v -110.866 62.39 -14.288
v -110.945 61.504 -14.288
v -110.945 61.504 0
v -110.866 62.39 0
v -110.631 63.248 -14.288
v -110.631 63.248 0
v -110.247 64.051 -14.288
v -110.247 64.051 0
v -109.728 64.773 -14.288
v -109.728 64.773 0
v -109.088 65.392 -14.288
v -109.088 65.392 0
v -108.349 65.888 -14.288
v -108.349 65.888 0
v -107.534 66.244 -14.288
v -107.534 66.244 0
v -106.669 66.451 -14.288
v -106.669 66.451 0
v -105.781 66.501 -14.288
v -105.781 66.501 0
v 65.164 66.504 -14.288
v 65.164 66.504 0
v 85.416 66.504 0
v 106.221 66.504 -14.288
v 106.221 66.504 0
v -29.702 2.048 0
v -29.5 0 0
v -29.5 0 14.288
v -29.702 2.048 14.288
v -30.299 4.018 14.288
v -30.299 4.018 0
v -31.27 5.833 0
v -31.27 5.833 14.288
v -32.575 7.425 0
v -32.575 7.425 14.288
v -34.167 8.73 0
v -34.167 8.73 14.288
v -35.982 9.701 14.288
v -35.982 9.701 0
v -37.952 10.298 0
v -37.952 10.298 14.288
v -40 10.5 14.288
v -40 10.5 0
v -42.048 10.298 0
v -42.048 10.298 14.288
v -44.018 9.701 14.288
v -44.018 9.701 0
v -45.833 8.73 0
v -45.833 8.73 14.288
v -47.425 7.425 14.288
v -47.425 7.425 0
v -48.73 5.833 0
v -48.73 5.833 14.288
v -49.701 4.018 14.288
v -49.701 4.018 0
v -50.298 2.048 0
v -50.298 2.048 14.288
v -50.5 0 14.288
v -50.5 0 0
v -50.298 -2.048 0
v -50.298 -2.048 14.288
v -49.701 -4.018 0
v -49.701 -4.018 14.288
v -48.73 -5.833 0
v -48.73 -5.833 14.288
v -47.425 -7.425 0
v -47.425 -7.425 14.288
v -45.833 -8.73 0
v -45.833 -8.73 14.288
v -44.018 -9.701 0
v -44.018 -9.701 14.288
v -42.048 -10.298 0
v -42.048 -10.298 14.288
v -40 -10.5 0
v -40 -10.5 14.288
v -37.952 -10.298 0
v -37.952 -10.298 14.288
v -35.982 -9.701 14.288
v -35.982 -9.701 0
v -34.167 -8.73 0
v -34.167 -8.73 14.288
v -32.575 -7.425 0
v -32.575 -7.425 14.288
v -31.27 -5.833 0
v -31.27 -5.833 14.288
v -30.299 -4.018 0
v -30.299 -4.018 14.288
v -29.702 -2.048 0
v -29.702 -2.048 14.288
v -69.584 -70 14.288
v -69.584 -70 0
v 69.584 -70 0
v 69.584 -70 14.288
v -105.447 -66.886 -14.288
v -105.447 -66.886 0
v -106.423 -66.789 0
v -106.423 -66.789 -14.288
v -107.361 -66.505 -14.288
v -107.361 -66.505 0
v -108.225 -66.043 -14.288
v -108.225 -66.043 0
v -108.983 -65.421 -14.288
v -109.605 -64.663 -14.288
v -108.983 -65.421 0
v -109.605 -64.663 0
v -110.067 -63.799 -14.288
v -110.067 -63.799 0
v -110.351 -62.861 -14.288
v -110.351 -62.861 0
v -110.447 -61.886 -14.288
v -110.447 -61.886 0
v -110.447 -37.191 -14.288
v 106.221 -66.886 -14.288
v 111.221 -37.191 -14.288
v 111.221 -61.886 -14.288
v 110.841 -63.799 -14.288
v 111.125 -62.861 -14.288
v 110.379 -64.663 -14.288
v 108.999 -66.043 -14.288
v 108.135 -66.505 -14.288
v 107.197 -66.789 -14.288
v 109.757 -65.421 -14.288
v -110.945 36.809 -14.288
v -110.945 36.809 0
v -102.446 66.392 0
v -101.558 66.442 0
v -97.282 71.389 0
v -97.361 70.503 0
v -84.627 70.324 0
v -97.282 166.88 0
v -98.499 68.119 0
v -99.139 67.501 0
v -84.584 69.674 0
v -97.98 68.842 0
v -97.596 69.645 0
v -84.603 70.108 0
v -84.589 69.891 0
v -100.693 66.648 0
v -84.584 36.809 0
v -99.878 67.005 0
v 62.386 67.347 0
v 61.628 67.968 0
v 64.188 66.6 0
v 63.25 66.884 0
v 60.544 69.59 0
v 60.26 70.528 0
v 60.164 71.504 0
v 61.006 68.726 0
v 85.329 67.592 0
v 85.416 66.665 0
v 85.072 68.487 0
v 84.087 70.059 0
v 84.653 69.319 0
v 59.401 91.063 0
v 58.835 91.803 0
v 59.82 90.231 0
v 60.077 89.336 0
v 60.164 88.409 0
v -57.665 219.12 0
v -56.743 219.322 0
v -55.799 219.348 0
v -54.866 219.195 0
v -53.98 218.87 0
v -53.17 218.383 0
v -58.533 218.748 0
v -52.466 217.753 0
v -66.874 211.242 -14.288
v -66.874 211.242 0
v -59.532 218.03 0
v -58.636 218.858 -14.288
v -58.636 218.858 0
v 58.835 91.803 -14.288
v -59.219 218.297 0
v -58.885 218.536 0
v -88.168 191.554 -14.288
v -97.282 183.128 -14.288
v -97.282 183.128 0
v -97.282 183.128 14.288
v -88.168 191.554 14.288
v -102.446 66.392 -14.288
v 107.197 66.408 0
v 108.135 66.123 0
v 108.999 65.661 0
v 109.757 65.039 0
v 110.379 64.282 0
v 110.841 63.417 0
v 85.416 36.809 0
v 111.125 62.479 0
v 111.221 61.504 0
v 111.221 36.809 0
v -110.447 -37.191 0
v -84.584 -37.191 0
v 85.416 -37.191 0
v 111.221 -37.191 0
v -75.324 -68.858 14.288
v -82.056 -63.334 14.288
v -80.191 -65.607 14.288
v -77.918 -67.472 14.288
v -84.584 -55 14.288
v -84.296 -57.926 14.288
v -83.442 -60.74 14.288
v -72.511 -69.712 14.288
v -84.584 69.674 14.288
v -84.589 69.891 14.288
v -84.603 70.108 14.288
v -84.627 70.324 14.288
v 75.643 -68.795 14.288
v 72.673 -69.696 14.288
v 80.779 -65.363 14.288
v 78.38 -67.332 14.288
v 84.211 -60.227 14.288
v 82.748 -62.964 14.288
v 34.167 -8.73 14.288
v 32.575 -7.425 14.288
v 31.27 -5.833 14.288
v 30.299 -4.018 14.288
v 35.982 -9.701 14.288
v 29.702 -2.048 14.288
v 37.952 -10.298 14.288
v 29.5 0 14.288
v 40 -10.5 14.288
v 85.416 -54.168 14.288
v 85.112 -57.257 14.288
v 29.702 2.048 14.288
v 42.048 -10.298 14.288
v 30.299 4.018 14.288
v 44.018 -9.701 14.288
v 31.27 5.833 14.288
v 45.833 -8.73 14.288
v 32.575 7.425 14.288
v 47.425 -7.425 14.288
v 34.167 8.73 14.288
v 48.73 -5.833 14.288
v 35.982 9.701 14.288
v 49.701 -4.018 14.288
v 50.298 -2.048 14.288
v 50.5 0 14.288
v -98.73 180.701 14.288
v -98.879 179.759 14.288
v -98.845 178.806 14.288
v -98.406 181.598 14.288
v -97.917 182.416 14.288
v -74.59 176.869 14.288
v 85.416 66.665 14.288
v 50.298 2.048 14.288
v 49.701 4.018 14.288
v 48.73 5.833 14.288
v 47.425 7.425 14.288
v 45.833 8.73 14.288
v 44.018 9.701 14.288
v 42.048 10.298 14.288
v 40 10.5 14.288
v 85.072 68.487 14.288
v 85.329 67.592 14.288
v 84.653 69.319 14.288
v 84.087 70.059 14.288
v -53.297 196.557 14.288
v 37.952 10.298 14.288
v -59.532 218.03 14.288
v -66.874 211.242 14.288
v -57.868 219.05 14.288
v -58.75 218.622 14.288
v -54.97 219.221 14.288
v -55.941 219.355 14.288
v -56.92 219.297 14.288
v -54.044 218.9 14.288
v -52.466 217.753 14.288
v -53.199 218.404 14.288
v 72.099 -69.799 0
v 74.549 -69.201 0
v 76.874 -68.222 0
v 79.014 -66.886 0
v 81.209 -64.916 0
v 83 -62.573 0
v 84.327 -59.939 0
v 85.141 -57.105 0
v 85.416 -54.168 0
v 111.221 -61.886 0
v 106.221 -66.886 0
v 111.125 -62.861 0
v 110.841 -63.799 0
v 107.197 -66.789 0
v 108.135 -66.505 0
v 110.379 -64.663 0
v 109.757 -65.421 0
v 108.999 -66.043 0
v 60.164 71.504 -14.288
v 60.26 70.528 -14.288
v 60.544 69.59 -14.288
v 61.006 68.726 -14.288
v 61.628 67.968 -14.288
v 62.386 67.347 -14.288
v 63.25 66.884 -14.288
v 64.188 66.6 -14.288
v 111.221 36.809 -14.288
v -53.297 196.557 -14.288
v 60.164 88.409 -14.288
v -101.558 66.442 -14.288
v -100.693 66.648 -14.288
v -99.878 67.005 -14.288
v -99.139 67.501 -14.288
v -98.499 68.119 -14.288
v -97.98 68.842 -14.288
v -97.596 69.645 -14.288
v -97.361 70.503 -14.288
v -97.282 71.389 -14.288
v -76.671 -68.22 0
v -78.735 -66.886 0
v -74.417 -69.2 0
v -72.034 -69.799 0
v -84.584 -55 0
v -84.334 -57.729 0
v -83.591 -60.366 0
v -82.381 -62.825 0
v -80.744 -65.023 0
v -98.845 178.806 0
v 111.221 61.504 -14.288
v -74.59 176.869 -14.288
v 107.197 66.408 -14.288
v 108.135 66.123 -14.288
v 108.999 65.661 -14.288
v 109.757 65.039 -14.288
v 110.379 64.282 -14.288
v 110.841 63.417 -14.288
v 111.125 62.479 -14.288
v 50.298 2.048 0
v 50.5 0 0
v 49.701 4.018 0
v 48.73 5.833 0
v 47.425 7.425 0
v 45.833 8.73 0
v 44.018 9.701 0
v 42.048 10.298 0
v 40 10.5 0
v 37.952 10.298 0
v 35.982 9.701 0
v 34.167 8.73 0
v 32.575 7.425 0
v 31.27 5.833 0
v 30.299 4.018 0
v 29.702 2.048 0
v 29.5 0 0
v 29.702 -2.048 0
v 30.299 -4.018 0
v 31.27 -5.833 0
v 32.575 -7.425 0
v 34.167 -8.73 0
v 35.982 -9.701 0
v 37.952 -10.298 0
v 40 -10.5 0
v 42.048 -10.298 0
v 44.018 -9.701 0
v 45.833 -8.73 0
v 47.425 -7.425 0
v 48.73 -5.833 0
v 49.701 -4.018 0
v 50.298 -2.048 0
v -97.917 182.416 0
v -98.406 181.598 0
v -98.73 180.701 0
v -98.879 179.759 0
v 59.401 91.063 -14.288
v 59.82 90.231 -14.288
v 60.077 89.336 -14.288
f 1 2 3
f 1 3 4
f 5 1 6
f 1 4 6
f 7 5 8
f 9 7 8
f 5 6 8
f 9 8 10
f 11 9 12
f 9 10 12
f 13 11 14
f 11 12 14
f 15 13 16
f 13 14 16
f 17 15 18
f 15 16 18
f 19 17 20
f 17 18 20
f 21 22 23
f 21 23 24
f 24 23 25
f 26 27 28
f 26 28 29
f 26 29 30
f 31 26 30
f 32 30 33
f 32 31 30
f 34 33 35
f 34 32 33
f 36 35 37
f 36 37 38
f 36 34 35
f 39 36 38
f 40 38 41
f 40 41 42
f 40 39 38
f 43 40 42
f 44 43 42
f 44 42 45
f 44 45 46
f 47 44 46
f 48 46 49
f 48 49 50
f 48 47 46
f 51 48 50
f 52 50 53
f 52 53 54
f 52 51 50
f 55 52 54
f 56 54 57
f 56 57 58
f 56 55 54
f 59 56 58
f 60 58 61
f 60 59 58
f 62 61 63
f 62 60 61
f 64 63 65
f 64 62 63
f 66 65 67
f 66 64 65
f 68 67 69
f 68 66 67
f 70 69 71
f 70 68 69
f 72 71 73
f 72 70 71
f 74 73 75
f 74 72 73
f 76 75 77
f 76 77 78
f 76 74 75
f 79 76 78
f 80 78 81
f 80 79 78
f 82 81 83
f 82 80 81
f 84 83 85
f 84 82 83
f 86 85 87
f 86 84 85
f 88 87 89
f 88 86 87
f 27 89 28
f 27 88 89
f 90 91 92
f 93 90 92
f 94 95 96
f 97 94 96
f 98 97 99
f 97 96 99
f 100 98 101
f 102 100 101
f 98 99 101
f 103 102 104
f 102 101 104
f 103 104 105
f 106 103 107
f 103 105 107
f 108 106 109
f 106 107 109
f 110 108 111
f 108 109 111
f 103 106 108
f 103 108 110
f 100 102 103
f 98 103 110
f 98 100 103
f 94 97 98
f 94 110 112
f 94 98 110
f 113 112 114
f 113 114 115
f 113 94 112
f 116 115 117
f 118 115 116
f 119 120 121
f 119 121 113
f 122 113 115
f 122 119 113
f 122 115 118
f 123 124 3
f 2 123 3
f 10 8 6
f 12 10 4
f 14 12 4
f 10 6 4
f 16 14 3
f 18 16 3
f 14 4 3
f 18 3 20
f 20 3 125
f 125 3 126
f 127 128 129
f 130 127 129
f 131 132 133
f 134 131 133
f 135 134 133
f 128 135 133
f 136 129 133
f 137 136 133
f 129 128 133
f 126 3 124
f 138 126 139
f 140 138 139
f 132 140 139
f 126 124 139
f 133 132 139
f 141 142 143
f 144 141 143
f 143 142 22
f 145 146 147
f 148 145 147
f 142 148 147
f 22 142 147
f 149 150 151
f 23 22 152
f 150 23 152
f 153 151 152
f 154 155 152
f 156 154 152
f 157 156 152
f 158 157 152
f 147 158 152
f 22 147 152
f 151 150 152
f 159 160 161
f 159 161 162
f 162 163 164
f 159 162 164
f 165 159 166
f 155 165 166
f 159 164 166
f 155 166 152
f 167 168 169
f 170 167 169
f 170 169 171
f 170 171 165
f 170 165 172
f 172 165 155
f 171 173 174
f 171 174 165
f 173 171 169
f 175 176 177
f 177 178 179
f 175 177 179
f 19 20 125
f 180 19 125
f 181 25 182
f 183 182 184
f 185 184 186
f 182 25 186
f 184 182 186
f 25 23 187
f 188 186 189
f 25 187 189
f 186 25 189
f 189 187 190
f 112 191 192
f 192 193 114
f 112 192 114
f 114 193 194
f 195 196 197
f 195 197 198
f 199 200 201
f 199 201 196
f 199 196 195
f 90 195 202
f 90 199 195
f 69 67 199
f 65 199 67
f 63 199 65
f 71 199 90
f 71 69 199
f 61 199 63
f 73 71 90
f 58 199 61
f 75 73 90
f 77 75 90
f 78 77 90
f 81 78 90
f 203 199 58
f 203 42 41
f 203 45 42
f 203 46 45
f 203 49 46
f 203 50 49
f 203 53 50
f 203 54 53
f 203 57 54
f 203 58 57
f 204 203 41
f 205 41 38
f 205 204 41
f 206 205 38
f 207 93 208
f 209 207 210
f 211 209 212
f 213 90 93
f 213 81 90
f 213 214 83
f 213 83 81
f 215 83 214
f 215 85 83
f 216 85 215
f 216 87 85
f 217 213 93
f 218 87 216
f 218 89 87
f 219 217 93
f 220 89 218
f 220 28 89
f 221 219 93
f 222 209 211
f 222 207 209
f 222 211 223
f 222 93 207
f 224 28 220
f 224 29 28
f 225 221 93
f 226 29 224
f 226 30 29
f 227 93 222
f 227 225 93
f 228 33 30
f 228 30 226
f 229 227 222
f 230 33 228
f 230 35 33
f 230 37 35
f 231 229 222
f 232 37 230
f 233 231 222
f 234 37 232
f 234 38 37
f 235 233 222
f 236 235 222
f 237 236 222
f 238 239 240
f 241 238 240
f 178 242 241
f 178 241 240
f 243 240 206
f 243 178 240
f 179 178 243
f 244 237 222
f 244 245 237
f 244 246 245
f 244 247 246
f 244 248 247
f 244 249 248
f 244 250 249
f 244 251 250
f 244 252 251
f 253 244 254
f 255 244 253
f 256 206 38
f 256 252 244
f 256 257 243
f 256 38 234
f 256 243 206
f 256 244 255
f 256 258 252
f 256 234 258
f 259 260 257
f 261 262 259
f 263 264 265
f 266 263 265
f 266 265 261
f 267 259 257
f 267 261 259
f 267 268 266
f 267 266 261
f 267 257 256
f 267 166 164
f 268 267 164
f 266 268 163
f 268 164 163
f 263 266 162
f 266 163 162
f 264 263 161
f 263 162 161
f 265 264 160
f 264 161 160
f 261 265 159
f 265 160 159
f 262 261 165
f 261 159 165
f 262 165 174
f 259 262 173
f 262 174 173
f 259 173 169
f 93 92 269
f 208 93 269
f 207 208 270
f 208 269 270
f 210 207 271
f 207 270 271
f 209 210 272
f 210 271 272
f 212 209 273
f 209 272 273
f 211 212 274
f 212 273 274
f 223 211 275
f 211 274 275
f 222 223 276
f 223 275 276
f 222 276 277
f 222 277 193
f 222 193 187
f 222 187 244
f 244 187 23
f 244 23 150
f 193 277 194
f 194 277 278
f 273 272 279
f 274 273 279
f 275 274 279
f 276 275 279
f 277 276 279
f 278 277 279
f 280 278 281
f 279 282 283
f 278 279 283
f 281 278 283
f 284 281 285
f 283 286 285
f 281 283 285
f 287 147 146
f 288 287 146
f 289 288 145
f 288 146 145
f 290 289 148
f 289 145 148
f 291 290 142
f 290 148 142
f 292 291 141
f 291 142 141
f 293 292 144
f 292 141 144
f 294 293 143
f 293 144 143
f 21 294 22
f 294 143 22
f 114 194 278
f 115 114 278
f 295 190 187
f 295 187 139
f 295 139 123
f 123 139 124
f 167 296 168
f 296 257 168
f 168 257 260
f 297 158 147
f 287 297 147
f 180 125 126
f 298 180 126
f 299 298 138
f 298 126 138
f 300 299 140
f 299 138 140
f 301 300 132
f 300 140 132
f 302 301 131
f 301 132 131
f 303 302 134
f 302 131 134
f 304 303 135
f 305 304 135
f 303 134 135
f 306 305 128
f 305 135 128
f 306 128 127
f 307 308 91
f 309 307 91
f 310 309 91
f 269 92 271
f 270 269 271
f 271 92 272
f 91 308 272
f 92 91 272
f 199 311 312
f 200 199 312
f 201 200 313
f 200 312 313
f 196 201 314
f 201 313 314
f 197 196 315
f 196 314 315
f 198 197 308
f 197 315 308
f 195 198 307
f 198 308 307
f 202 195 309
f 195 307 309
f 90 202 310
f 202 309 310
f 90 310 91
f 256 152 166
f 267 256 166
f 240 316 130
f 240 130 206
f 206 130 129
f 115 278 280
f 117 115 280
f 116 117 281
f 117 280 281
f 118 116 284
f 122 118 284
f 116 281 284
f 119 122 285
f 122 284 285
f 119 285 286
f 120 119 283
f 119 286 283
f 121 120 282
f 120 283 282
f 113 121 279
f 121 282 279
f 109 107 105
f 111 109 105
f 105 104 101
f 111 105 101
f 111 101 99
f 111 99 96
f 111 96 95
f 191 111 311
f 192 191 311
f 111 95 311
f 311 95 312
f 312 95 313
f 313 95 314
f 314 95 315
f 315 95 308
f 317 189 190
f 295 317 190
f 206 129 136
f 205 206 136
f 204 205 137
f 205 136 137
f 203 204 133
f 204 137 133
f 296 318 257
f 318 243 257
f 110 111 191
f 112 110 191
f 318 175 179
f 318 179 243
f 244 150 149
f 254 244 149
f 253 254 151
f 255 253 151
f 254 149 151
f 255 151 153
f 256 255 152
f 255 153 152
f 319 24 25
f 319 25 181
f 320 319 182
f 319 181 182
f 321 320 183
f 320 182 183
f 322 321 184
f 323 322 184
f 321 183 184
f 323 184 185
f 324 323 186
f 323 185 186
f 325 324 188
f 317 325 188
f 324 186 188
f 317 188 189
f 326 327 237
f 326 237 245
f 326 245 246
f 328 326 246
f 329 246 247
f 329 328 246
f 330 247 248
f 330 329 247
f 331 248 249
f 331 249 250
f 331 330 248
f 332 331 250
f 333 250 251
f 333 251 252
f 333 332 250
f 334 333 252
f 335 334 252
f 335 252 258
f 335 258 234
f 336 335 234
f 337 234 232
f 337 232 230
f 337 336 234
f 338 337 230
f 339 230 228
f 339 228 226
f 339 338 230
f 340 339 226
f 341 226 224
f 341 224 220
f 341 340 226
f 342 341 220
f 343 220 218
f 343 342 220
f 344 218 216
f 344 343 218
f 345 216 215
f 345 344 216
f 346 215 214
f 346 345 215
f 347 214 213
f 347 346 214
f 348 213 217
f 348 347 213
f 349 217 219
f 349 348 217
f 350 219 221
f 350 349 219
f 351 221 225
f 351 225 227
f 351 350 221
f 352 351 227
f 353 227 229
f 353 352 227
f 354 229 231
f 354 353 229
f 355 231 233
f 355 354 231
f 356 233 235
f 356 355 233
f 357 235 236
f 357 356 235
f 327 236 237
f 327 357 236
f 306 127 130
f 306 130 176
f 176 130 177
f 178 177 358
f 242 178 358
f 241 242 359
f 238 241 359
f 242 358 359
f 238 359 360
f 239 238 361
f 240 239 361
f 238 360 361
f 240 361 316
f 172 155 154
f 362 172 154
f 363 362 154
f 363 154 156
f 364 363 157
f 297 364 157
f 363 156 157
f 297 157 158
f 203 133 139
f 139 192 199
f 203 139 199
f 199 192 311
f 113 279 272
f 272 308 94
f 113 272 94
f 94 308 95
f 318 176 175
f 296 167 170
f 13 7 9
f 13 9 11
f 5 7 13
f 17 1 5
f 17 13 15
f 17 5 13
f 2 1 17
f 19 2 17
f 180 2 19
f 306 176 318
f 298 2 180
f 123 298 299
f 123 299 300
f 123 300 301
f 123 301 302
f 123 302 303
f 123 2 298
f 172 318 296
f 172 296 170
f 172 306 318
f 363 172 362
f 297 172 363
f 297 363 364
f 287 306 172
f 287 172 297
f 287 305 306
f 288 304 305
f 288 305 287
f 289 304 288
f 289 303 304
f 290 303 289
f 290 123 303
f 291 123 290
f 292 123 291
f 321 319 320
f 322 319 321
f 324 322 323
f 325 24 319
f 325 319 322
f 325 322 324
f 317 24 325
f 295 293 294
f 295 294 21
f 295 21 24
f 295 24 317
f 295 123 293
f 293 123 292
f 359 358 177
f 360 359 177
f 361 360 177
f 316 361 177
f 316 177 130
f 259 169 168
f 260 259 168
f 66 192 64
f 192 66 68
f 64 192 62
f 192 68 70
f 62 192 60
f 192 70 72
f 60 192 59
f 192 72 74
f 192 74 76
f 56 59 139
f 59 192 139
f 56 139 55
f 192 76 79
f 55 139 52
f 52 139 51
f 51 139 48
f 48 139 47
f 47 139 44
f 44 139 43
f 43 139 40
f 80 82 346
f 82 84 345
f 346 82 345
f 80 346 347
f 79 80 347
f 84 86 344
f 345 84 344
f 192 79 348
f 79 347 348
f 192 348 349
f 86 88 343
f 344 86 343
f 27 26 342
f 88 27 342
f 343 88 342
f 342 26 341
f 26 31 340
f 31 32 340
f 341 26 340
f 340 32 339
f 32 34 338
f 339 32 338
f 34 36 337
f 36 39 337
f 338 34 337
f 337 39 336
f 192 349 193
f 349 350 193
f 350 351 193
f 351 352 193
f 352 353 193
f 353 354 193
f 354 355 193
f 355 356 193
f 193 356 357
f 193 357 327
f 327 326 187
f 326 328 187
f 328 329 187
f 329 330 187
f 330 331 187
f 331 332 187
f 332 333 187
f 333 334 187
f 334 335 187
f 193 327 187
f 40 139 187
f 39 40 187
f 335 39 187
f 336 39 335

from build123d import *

# Parameters (mm, degrees)
F0_R     = 10.5
F1_DEPTH = 14.2875
F3_DEPTH = 14.2875
F5_DEPTH = 14.2875


# Not quite as in the source:
# - a length typed as a fraction of an inch, garbled in the dataset ("3 / 203.2 mm" for 3/8 in), is restored
# - a feature names something its author has since deleted; it is built from what else it names


with BuildPart() as f1:
    # F0 (on Top) → F1 (new body)
    with BuildSketch(Plane.XY):
        with BuildLine():
            ThreePointArc((-84.5842045546, -55), (-80.1908062724, -65.6066017178), (-69.5842045546, -70))
            Line((-69.5842045546, -70), (69.5842045546, -70))
            ThreePointArc((69.5842045546, -70), (80.7788298305, -65.363034385), (85.4157954454, -54.1684091091))
            Line((85.4157954454, -54.1684091091), (85.4157954454, 66.6648875964))
            ThreePointArc((85.4157954454, 66.6648875964), (85.0717839963, 68.487460123), (84.0870871996, 70.0592383231))
            Line((84.0870871996, 70.0592383231), (-52.4659380977, 217.7534620916))
            ThreePointArc((-52.4659380977, 217.7534620916), (-55.9414029733, 219.3552750765), (-59.5315805785, 218.030403119))
            Line((-59.5315805785, 218.030403119), (-66.8741640868, 211.2417016656))
            Line((-66.8741640868, 211.2417016656), (-53.29676118, 196.556534649))
            Line((-53.29676118, 196.556534649), (-63.9435072671, 186.7129175415))
            Line((-63.9435072671, 186.7129175415), (-74.5902533541, 176.8693004341))
            Line((-74.5902533541, 176.8693004341), (-88.1676562609, 191.5544674507))
            Line((-88.1676562609, 191.5544674507), (-97.2821017235, 183.1275630663))
            ThreePointArc((-97.2821017235, 183.1275630663), (-98.5895263572, 181.1572441104), (-98.845348912, 178.8064844924))
            Line((-98.845348912, 178.8064844924), (-84.6266066394, 70.3235099279))
            ThreePointArc((-84.6266066394, 70.3235099279), (-84.5948163368, 69.9993075241), (-84.5842045546, 69.673723108))
            Line((-84.5842045546, 69.673723108), (-84.5842045546, -55))
        make_face()
        with Locations((-40, 0)):
            Circle(F0_R, mode=Mode.SUBTRACT)
        with Locations((40, 0)):
            Circle(F0_R, mode=Mode.SUBTRACT)
    extrude(amount=F1_DEPTH)

    # F2 (on face) → F3 (join)
    with BuildSketch(Plane(origin=(0, 0, 0), x_dir=(1, 0, 0), z_dir=(0, 0, -1))):
        with BuildLine():
            ThreePointArc((111.2211793661, 61.8855160475), (109.756713272, 65.4210499534), (106.2211793661, 66.8855160475))
            Line((106.2211793661, 66.8855160475), (79.0136510523, 66.8855160475))
            ThreePointArc((79.0136510523, 66.8855160475), (83.7249684911, 61.287261926), (85.4157954454, 54.1684091091))
            Line((85.4157954454, 54.1684091091), (85.4157954454, 37.1908284724))
            Line((85.4157954454, 37.1908284724), (111.2211793661, 37.1908284724))
            Line((111.2211793661, 37.1908284724), (111.2211793661, 61.8855160475))
        make_face()
        with BuildLine():
            ThreePointArc((85.4157954454, 54.1684091091), (83.7249684911, 61.287261926), (79.0136510523, 66.8855160475))
            Line((79.0136510523, 66.8855160475), (-78.7348607215, 66.8855160475))
            ThreePointArc((-78.7348607215, 66.8855160475), (-83.0426562208, 61.623449158), (-84.5842045546, 55))
            Line((-84.5842045546, 55), (-84.5842045546, 37.1908284724))
            Line((-84.5842045546, 37.1908284724), (85.4157954454, 37.1908284724))
            Line((85.4157954454, 37.1908284724), (85.4157954454, 54.1684091091))
        make_face()
        with BuildLine():
            ThreePointArc((-84.5842045546, 55), (-83.0426562208, 61.623449158), (-78.7348607215, 66.8855160475))
            Line((-78.7348607215, 66.8855160475), (-105.4471534491, 66.8855160475))
            ThreePointArc((-105.4471534491, 66.8855160475), (-108.982687355, 65.4210499534), (-110.4471534491, 61.8855160475))
            Line((-110.4471534491, 61.8855160475), (-110.4471534491, 37.1908284724))
            Line((-110.4471534491, 37.1908284724), (-84.5842045546, 37.1908284724))
            Line((-84.5842045546, 37.1908284724), (-84.5842045546, 55))
        make_face()
    extrude(amount=F3_DEPTH)

    # F4 (on face) → F5 (join)
    with BuildSketch(Plane(origin=(0, 0, 0), x_dir=(1, 0, 0), z_dir=(0, 0, -1))):
        with BuildLine():
            Line((111.2211793661, -36.8091715276), (-110.9449085174, -36.8091715276))
            Line((-110.9449085174, -36.8091715276), (-110.9449085174, -61.5038591027))
            ThreePointArc((-110.9449085174, -61.5038591027), (-109.4218951426, -65.0969864325), (-105.7806829141, -66.5011613701))
            Line((-105.7806829141, -66.5011613701), (-102.4463273268, -66.3915849369))
            ThreePointArc((-102.4463273268, -66.3915849369), (-98.8051150983, -67.7957598744), (-97.2821017235, -71.3888872042))
            Line((-97.2821017235, -71.3888872042), (-97.2821017235, -183.1275630663))
            Line((-97.2821017235, -183.1275630663), (-88.1676562609, -191.5544674507))
            Line((-88.1676562609, -191.5544674507), (-74.5902533541, -176.8693004341))
            Line((-74.5902533541, -176.8693004341), (-53.29676118, -196.556534649))
            Line((-53.29676118, -196.556534649), (-66.8741640868, -211.2417016656))
            Line((-66.8741640868, -211.2417016656), (-58.6359989162, -218.8584272777))
            Line((-58.6359989162, -218.8584272777), (58.8349498664, -91.8031638881))
            ThreePointArc((58.8349498664, -91.8031638881), (59.8196466631, -90.2313856879), (60.1636581123, -88.4088131614))
            Line((60.1636581123, -88.4088131614), (60.1636581123, -71.5038591027))
            ThreePointArc((60.1636581123, -71.5038591027), (61.6281242064, -67.9683251968), (65.1636581123, -66.5038591027))
            Line((65.1636581123, -66.5038591027), (106.2211793661, -66.5038591027))
            ThreePointArc((106.2211793661, -66.5038591027), (109.756713272, -65.0393930087), (111.2211793661, -61.5038591027))
            Line((111.2211793661, -61.5038591027), (111.2211793661, -36.8091715276))
        make_face()
    extrude(amount=F5_DEPTH)


solid = f1.part
